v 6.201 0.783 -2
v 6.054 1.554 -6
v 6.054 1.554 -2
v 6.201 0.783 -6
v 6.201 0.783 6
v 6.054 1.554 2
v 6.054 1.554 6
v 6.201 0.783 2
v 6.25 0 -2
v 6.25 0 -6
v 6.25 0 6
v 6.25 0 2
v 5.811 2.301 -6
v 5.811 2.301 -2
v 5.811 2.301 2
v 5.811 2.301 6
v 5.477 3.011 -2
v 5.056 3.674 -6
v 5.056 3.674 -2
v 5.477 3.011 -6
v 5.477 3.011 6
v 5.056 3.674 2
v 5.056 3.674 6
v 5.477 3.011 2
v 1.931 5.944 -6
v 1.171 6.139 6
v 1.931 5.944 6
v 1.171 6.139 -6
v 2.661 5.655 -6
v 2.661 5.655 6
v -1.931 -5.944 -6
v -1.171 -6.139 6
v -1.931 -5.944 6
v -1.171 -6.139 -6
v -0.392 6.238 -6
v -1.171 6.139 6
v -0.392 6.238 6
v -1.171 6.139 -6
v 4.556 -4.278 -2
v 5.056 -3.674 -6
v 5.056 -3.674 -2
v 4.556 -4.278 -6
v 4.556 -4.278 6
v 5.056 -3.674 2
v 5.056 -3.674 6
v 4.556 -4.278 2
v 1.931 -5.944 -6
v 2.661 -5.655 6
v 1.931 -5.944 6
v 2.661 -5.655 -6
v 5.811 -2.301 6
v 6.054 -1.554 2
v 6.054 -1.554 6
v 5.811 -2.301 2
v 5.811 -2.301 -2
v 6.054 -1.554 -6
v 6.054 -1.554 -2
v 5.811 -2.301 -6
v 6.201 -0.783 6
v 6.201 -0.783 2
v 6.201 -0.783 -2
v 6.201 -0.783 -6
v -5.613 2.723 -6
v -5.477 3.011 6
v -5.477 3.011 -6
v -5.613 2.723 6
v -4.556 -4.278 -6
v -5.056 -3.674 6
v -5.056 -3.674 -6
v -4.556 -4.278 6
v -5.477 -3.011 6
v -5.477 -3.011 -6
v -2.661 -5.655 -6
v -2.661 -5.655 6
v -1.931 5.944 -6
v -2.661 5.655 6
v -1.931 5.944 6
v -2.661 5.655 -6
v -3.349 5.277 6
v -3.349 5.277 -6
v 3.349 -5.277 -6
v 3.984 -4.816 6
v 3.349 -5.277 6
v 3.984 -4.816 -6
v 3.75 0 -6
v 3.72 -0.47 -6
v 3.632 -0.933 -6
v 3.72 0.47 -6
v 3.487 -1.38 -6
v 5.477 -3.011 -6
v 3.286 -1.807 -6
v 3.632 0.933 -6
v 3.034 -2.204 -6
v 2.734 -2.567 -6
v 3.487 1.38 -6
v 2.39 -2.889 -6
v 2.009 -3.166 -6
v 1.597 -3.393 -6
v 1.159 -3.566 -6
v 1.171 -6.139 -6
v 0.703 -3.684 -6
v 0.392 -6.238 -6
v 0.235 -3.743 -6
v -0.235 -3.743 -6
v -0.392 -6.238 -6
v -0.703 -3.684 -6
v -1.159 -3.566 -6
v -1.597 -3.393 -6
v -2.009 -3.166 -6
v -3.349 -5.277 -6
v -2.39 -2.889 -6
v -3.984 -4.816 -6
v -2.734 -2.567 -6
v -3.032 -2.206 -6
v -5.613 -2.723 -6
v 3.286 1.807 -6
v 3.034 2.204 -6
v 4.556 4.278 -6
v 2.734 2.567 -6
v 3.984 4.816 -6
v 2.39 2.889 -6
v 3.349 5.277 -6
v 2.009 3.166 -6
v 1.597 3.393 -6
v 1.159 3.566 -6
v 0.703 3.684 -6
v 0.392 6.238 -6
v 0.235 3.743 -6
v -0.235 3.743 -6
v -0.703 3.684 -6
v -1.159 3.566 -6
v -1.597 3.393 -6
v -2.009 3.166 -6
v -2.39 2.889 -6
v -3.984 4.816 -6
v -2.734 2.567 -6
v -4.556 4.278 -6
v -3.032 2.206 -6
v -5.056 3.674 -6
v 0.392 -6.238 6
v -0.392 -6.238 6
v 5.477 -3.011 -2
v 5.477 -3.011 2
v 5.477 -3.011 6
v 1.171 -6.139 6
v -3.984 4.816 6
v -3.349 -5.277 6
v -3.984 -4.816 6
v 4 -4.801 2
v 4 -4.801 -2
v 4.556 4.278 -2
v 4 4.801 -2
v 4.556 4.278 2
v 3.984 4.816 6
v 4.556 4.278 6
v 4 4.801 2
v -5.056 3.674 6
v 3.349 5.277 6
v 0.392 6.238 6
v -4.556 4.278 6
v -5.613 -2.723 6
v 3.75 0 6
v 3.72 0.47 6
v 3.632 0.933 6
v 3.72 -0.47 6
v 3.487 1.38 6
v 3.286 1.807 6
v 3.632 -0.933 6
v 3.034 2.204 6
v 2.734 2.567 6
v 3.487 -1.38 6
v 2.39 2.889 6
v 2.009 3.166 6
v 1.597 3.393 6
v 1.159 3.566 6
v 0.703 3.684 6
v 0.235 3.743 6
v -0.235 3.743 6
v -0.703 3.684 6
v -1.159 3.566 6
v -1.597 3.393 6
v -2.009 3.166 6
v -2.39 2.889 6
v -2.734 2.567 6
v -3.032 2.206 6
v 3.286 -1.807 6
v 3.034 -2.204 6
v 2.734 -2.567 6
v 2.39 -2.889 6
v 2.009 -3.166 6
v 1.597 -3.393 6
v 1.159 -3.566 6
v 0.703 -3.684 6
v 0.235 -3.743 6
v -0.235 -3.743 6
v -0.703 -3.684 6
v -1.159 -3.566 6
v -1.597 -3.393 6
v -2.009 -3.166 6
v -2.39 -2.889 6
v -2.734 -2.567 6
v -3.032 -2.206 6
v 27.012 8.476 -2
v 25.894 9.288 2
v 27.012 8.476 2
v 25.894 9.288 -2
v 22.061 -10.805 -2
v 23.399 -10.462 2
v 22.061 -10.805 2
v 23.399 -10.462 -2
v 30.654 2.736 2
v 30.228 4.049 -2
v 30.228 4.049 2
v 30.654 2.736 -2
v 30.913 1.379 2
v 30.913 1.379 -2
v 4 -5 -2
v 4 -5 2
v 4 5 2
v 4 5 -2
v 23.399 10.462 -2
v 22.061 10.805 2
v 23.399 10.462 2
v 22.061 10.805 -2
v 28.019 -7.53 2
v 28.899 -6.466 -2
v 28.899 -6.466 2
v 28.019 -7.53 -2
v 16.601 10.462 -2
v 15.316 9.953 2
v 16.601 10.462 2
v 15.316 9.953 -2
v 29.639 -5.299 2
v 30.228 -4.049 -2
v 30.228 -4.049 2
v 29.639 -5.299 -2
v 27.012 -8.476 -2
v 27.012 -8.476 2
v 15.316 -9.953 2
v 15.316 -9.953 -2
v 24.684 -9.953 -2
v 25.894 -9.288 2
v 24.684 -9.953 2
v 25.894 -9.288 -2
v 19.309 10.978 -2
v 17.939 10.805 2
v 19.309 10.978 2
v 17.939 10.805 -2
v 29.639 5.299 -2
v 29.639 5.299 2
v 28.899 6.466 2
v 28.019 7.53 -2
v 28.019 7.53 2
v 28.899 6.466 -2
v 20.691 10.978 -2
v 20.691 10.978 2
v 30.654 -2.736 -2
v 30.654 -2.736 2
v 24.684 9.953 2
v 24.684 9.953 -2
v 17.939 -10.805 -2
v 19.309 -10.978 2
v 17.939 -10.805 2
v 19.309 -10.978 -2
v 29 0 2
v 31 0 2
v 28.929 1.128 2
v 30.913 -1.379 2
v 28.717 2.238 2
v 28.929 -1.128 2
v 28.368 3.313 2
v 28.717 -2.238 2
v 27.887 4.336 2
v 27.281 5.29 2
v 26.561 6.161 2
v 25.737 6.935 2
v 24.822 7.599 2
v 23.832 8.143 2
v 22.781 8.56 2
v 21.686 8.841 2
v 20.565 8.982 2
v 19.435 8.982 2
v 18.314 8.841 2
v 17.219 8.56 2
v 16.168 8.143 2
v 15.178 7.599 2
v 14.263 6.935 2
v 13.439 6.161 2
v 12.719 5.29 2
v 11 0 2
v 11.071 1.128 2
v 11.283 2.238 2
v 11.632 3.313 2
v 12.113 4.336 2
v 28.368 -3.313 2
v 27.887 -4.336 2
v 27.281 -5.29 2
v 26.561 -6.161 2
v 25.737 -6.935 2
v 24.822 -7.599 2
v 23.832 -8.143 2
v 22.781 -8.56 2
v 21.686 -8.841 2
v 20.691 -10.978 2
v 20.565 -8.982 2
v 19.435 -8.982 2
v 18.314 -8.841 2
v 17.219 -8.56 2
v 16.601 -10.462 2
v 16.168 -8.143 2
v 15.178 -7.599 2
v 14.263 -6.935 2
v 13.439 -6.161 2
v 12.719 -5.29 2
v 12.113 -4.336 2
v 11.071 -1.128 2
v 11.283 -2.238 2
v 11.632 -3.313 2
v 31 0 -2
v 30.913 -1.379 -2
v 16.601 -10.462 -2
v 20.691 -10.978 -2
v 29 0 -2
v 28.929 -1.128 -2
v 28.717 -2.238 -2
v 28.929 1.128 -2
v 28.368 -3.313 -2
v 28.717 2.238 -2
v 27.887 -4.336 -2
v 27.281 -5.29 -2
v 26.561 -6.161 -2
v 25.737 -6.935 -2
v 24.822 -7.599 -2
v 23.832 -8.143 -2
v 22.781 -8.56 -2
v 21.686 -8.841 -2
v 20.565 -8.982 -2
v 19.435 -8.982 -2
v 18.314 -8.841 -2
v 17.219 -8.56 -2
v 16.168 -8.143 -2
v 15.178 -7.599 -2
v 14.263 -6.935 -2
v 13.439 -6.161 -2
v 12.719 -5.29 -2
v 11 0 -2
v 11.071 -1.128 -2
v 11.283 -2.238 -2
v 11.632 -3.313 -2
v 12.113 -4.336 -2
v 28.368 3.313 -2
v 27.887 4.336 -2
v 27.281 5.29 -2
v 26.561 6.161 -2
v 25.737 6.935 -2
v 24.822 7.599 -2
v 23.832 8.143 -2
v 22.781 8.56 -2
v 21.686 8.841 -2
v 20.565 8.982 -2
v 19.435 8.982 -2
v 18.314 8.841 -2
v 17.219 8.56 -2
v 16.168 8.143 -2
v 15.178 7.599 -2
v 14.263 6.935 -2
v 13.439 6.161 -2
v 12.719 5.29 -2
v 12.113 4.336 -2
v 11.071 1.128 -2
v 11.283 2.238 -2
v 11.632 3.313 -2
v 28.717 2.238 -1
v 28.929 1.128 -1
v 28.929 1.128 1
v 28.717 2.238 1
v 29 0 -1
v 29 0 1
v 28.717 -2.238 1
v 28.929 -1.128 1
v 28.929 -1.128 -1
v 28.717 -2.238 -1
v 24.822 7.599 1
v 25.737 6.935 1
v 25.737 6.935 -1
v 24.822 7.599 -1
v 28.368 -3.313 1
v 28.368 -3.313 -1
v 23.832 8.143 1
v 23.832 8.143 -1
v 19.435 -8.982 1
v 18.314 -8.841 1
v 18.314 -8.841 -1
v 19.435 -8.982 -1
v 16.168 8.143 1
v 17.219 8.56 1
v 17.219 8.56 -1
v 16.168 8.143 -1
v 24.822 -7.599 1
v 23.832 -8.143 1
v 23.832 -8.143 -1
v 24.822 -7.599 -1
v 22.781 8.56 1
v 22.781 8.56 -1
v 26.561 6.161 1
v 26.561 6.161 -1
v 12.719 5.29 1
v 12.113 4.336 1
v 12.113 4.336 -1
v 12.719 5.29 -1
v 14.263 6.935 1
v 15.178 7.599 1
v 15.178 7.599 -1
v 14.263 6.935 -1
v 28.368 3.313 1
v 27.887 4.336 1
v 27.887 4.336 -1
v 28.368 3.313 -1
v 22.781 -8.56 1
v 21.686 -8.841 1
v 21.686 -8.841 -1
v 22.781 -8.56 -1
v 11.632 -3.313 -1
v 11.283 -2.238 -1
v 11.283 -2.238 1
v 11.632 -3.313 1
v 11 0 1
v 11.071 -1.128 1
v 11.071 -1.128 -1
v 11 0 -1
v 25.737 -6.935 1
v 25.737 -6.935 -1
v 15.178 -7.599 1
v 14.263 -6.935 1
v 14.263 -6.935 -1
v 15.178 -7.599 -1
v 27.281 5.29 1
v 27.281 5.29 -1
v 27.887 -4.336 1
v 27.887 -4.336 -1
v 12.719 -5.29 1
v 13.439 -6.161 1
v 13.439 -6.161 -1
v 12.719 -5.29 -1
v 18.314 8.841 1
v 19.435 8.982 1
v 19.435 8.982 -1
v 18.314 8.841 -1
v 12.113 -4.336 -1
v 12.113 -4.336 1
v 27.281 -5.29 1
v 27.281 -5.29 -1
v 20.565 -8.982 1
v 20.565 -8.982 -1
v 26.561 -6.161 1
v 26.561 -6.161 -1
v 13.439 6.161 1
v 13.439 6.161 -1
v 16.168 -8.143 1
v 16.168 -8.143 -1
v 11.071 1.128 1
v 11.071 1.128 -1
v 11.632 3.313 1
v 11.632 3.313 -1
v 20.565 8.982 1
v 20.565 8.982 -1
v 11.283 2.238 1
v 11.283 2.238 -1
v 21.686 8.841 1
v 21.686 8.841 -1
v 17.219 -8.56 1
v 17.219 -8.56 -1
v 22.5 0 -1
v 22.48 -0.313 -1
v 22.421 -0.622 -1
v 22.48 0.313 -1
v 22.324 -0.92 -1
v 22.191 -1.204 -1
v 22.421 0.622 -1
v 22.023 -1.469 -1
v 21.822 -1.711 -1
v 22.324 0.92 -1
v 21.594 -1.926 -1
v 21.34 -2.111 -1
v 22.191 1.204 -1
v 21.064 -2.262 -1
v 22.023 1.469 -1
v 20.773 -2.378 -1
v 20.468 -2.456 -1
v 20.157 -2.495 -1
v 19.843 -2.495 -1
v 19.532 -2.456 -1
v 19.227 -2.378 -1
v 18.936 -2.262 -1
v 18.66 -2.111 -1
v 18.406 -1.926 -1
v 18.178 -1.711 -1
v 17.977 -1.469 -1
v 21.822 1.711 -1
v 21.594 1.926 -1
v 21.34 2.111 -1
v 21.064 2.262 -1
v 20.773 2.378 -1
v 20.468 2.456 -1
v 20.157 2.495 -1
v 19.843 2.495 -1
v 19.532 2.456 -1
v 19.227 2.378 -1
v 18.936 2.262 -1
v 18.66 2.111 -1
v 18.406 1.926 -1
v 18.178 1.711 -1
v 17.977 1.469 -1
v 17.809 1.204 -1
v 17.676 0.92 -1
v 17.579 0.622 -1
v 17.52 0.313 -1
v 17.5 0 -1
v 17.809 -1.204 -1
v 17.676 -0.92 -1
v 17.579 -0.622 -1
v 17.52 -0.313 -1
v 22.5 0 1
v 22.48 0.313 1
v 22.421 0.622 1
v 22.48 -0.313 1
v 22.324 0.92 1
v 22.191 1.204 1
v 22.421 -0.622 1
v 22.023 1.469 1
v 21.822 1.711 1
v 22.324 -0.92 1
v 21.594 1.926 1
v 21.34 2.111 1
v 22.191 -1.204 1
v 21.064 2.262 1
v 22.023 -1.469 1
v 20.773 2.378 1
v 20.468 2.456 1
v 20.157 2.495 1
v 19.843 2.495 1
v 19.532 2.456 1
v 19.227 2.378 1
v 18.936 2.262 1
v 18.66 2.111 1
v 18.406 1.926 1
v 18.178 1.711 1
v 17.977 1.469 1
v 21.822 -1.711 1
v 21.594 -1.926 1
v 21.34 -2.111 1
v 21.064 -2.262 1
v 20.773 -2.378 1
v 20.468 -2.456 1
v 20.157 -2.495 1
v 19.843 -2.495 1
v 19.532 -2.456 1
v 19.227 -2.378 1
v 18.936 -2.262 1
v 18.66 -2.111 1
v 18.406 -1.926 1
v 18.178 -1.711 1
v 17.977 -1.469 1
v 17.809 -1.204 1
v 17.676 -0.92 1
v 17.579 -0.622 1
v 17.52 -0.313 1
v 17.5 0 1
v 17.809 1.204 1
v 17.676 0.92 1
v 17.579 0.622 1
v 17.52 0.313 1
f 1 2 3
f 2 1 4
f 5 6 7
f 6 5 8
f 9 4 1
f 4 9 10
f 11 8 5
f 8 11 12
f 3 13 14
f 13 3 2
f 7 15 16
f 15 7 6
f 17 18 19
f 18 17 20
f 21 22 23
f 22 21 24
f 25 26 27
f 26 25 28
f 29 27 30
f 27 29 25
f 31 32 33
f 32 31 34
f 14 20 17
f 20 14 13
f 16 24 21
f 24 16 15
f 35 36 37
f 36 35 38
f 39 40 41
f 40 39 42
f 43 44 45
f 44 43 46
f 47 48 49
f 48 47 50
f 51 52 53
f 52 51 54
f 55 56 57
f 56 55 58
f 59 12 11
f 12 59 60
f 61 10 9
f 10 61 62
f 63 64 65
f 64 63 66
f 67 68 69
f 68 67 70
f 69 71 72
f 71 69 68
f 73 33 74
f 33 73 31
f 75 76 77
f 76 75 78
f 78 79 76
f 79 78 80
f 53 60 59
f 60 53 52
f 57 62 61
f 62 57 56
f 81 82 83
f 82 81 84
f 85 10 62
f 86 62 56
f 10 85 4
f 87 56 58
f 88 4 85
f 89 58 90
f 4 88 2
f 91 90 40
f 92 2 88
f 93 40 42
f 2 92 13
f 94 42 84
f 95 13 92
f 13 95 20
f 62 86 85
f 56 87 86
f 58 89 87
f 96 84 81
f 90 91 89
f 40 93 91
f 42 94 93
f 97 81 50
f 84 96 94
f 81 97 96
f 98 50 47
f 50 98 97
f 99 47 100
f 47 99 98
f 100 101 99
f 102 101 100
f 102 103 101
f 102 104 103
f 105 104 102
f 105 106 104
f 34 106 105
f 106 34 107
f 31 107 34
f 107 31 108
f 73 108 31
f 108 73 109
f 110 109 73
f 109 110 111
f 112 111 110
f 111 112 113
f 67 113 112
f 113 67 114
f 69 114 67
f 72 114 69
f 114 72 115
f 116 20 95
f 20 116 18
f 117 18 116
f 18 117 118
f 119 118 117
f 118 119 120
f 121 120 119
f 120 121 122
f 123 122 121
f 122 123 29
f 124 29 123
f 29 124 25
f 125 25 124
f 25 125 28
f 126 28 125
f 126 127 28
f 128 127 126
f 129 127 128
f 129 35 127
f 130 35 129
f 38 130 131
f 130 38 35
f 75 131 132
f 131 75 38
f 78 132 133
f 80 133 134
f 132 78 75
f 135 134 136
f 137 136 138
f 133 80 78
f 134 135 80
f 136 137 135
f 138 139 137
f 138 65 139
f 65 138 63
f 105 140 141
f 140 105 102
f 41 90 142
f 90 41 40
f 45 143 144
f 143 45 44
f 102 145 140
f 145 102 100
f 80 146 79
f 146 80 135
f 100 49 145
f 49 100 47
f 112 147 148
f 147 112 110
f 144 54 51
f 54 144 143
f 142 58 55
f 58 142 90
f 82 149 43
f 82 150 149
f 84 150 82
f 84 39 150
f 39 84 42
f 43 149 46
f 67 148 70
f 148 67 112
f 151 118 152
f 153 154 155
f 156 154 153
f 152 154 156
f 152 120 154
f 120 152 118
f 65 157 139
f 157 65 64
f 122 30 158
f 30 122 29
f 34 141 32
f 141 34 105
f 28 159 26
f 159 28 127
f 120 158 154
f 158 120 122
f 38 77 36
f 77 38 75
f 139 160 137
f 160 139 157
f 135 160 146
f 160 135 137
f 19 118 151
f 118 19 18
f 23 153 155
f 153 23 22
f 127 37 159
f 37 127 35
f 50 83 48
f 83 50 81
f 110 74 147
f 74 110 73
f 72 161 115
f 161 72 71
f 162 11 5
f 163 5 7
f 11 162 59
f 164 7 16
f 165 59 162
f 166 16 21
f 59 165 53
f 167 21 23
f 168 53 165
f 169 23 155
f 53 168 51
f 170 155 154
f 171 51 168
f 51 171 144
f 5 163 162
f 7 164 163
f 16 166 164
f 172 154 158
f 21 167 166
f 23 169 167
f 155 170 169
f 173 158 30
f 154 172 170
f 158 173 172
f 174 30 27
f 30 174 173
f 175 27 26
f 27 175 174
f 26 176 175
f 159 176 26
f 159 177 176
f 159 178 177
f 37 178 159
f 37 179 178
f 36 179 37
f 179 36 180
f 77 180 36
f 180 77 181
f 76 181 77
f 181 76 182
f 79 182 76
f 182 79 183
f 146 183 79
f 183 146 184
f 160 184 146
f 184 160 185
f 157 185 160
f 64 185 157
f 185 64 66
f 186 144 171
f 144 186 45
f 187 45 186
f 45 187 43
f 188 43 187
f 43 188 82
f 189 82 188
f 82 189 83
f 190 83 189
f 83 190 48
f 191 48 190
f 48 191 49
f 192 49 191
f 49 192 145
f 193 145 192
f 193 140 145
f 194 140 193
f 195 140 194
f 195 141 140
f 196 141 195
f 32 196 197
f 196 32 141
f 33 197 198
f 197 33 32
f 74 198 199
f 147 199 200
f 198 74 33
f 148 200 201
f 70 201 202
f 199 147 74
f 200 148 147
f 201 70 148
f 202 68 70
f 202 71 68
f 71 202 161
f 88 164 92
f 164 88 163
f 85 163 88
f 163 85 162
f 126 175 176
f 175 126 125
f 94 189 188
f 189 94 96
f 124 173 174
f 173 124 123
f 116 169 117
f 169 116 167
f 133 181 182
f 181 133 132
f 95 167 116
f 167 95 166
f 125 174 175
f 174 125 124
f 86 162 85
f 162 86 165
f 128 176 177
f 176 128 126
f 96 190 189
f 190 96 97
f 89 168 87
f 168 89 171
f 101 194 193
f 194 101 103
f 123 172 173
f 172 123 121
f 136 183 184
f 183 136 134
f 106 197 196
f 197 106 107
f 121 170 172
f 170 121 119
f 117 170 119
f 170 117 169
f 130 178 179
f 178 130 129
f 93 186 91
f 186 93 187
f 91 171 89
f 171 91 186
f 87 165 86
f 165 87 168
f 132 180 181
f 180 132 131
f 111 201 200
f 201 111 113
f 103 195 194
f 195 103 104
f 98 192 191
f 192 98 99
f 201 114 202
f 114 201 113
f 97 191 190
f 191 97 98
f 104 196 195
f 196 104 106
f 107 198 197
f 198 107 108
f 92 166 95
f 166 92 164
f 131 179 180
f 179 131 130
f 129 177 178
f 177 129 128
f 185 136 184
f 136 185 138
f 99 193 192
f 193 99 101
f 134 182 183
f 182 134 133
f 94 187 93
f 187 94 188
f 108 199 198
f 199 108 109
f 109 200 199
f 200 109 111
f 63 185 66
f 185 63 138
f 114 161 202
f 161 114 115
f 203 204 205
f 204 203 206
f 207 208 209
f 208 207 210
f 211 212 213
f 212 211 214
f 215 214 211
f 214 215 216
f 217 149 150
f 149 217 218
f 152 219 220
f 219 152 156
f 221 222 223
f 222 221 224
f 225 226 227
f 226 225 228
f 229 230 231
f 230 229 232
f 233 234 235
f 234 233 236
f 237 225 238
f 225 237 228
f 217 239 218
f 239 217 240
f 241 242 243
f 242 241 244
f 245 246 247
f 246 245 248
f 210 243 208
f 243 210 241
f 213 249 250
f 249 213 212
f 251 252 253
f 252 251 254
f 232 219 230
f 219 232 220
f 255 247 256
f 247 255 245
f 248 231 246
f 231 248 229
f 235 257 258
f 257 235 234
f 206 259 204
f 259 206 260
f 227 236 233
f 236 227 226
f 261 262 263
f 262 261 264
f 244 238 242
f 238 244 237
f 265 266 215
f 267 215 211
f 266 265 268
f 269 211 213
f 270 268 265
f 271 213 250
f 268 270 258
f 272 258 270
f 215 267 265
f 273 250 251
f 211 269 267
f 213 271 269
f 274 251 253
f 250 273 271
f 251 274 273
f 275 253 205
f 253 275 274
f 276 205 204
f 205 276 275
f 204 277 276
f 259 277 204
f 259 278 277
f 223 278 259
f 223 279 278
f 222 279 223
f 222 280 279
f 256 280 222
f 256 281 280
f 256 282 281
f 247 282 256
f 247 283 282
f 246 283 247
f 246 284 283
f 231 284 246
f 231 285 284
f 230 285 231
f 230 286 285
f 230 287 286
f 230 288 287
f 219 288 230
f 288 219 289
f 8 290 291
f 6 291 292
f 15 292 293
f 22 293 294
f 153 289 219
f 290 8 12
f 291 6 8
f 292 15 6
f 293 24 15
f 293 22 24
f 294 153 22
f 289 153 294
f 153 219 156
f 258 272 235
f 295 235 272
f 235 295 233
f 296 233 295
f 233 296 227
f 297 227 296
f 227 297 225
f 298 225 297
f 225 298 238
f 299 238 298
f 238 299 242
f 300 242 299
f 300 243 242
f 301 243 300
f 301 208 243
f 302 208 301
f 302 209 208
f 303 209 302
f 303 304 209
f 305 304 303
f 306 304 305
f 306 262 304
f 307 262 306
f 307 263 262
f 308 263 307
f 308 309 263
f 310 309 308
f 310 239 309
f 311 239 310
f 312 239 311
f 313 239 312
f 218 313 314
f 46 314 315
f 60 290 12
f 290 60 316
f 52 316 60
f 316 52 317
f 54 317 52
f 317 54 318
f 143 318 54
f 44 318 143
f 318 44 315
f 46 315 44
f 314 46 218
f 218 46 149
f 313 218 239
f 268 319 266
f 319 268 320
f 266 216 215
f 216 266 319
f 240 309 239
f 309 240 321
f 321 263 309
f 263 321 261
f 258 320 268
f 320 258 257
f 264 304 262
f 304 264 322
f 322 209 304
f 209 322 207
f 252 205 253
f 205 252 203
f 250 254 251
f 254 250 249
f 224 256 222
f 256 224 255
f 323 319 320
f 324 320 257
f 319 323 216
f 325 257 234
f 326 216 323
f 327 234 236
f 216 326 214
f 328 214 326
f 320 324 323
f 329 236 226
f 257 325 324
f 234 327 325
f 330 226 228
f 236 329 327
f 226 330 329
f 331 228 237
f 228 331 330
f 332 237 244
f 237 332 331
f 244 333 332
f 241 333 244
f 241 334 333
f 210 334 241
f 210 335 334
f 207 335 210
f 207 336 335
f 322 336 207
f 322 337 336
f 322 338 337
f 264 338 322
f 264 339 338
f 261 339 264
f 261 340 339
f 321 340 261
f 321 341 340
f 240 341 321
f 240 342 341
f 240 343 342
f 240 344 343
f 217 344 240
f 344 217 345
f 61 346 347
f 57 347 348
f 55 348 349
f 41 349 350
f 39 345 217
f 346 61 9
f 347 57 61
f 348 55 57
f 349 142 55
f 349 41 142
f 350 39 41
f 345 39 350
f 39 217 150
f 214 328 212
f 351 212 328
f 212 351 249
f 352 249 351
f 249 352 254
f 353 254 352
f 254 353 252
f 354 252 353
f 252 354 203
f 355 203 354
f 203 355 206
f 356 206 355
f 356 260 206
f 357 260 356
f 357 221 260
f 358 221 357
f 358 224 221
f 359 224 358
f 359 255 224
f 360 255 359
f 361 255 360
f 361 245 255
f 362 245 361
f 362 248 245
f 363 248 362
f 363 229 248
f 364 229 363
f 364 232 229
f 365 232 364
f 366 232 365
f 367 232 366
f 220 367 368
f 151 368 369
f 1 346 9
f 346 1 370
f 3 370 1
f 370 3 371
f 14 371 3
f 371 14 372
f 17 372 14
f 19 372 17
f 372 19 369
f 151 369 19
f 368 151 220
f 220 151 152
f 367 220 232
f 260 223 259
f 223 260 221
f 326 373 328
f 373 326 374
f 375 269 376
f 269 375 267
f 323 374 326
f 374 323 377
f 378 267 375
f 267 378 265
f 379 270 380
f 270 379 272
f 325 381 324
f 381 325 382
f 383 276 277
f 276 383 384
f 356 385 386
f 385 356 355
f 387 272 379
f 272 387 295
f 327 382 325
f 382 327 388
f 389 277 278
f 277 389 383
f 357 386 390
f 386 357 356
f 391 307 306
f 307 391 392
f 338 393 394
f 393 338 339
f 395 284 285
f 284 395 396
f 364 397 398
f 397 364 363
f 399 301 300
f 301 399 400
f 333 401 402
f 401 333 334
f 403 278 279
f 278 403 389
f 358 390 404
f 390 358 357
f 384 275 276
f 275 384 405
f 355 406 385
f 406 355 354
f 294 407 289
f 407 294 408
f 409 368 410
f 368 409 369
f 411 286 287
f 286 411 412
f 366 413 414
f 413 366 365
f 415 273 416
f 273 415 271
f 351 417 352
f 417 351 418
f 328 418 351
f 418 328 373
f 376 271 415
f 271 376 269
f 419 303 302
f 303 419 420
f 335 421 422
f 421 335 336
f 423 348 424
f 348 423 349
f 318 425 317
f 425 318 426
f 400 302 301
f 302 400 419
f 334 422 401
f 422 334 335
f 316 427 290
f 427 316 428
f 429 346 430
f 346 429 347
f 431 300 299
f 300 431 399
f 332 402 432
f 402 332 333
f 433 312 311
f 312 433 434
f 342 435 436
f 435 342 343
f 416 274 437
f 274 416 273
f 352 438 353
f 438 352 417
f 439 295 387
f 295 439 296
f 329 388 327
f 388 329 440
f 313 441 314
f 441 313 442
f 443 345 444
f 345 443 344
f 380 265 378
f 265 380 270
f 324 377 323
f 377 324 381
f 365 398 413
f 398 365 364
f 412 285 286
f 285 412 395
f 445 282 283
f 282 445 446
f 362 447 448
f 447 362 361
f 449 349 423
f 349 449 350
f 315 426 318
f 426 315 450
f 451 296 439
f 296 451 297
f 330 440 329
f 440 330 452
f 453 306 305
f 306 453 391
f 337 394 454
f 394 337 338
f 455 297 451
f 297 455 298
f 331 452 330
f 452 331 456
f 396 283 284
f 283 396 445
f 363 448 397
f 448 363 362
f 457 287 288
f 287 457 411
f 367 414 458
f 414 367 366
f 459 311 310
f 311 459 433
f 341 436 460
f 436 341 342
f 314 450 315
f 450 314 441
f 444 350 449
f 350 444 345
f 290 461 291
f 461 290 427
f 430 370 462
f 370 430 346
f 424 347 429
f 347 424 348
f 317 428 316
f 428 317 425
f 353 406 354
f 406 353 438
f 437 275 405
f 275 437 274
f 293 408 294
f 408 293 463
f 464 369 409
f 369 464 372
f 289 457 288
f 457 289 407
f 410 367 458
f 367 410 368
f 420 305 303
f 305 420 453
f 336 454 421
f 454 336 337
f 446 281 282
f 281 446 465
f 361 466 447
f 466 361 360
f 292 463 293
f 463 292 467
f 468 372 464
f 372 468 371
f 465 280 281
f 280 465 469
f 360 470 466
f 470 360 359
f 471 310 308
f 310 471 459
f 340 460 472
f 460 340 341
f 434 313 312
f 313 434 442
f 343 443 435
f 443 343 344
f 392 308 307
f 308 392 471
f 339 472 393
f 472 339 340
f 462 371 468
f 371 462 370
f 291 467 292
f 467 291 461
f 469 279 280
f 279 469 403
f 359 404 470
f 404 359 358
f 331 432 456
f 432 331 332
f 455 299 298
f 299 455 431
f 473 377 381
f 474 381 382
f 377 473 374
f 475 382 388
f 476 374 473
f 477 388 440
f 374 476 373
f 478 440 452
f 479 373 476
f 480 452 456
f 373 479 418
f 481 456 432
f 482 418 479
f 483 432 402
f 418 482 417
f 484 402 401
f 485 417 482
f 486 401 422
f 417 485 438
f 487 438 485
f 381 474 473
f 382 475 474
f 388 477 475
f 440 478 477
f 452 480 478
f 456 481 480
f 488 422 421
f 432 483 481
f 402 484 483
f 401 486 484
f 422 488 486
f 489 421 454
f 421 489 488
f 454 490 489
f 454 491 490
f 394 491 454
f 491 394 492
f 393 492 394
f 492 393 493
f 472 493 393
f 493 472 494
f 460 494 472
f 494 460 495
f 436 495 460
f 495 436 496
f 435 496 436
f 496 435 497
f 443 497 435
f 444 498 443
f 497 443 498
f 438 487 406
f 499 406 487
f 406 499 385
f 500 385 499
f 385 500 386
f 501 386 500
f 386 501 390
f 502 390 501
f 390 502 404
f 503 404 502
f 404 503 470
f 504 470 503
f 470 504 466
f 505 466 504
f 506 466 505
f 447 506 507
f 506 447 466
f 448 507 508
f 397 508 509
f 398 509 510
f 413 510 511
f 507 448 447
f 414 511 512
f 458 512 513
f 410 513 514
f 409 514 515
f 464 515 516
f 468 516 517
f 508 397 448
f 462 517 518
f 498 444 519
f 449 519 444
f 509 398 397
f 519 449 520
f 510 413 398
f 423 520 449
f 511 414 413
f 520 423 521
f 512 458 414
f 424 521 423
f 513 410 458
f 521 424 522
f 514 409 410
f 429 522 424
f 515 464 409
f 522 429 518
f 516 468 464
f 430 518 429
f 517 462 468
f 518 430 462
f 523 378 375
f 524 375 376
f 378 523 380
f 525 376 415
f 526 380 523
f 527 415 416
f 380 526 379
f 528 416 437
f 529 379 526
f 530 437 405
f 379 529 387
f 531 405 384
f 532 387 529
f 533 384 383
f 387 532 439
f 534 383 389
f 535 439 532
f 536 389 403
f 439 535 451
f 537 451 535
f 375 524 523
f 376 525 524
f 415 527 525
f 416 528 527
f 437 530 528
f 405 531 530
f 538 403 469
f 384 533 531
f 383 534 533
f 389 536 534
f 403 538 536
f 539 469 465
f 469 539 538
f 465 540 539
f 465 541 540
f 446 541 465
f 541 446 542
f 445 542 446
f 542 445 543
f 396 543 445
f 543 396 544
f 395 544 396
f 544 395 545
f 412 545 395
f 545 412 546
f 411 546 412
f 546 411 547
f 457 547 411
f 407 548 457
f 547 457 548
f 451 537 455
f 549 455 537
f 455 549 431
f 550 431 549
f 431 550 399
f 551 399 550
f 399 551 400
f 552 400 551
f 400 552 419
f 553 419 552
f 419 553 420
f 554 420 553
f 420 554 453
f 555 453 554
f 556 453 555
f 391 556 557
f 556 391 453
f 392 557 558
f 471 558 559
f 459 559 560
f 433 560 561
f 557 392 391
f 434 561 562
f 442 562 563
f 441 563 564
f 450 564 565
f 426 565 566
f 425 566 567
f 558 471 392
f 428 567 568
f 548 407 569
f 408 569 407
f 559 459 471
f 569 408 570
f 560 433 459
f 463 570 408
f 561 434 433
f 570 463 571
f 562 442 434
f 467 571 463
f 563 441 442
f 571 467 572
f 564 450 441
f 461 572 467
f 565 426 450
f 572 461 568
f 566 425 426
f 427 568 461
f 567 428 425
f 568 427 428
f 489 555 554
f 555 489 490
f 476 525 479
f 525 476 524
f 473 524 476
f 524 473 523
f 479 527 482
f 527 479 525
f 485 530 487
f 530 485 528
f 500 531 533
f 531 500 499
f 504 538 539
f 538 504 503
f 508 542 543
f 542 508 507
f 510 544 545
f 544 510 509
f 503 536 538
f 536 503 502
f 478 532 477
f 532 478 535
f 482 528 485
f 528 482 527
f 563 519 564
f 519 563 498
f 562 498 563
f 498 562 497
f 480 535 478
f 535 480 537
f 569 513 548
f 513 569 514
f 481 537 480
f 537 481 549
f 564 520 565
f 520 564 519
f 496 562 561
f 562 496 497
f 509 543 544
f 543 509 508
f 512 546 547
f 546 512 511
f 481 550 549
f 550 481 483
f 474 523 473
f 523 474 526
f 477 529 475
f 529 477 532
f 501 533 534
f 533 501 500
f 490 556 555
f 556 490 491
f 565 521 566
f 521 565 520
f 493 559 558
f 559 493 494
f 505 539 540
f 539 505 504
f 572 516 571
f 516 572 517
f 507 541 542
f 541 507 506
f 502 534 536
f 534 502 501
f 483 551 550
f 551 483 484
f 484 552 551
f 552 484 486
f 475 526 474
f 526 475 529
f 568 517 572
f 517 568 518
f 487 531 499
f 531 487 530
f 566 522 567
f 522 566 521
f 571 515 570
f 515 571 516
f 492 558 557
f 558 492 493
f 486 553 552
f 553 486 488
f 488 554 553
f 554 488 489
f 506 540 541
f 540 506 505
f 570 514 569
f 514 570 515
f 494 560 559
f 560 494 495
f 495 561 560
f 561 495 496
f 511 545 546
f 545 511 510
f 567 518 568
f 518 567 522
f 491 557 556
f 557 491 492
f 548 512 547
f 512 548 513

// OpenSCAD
$fn=50;

difference(){
  cylinder(h=12,d=12.5,center=true);
  translate([0,0,0]){
    cylinder(h=14,d=7.5, center=true);
  }

  linear_extrude(height=14, center=true)
  polygon(points=[[-3,2.2],[-3,-2.2],[-7,-3],[-7,3]]);

}

difference(){
  hull(){
    translate([9,0,0]){
      cube([10,10,4], center=true);
    }

    translate([20,0,0]){
      cylinder(h=4,d=22,center=true);
    }
  }
  translate([20,0,0]){
    cylinder(h=5,d=18, center=true);
  }
}

difference(){
  translate([20,0,0]){
    cylinder(h=2,d=18, center=true);
  }
  translate([20,0,0]){
    cylinder(h=3,d=5, center=true);
  }
}
